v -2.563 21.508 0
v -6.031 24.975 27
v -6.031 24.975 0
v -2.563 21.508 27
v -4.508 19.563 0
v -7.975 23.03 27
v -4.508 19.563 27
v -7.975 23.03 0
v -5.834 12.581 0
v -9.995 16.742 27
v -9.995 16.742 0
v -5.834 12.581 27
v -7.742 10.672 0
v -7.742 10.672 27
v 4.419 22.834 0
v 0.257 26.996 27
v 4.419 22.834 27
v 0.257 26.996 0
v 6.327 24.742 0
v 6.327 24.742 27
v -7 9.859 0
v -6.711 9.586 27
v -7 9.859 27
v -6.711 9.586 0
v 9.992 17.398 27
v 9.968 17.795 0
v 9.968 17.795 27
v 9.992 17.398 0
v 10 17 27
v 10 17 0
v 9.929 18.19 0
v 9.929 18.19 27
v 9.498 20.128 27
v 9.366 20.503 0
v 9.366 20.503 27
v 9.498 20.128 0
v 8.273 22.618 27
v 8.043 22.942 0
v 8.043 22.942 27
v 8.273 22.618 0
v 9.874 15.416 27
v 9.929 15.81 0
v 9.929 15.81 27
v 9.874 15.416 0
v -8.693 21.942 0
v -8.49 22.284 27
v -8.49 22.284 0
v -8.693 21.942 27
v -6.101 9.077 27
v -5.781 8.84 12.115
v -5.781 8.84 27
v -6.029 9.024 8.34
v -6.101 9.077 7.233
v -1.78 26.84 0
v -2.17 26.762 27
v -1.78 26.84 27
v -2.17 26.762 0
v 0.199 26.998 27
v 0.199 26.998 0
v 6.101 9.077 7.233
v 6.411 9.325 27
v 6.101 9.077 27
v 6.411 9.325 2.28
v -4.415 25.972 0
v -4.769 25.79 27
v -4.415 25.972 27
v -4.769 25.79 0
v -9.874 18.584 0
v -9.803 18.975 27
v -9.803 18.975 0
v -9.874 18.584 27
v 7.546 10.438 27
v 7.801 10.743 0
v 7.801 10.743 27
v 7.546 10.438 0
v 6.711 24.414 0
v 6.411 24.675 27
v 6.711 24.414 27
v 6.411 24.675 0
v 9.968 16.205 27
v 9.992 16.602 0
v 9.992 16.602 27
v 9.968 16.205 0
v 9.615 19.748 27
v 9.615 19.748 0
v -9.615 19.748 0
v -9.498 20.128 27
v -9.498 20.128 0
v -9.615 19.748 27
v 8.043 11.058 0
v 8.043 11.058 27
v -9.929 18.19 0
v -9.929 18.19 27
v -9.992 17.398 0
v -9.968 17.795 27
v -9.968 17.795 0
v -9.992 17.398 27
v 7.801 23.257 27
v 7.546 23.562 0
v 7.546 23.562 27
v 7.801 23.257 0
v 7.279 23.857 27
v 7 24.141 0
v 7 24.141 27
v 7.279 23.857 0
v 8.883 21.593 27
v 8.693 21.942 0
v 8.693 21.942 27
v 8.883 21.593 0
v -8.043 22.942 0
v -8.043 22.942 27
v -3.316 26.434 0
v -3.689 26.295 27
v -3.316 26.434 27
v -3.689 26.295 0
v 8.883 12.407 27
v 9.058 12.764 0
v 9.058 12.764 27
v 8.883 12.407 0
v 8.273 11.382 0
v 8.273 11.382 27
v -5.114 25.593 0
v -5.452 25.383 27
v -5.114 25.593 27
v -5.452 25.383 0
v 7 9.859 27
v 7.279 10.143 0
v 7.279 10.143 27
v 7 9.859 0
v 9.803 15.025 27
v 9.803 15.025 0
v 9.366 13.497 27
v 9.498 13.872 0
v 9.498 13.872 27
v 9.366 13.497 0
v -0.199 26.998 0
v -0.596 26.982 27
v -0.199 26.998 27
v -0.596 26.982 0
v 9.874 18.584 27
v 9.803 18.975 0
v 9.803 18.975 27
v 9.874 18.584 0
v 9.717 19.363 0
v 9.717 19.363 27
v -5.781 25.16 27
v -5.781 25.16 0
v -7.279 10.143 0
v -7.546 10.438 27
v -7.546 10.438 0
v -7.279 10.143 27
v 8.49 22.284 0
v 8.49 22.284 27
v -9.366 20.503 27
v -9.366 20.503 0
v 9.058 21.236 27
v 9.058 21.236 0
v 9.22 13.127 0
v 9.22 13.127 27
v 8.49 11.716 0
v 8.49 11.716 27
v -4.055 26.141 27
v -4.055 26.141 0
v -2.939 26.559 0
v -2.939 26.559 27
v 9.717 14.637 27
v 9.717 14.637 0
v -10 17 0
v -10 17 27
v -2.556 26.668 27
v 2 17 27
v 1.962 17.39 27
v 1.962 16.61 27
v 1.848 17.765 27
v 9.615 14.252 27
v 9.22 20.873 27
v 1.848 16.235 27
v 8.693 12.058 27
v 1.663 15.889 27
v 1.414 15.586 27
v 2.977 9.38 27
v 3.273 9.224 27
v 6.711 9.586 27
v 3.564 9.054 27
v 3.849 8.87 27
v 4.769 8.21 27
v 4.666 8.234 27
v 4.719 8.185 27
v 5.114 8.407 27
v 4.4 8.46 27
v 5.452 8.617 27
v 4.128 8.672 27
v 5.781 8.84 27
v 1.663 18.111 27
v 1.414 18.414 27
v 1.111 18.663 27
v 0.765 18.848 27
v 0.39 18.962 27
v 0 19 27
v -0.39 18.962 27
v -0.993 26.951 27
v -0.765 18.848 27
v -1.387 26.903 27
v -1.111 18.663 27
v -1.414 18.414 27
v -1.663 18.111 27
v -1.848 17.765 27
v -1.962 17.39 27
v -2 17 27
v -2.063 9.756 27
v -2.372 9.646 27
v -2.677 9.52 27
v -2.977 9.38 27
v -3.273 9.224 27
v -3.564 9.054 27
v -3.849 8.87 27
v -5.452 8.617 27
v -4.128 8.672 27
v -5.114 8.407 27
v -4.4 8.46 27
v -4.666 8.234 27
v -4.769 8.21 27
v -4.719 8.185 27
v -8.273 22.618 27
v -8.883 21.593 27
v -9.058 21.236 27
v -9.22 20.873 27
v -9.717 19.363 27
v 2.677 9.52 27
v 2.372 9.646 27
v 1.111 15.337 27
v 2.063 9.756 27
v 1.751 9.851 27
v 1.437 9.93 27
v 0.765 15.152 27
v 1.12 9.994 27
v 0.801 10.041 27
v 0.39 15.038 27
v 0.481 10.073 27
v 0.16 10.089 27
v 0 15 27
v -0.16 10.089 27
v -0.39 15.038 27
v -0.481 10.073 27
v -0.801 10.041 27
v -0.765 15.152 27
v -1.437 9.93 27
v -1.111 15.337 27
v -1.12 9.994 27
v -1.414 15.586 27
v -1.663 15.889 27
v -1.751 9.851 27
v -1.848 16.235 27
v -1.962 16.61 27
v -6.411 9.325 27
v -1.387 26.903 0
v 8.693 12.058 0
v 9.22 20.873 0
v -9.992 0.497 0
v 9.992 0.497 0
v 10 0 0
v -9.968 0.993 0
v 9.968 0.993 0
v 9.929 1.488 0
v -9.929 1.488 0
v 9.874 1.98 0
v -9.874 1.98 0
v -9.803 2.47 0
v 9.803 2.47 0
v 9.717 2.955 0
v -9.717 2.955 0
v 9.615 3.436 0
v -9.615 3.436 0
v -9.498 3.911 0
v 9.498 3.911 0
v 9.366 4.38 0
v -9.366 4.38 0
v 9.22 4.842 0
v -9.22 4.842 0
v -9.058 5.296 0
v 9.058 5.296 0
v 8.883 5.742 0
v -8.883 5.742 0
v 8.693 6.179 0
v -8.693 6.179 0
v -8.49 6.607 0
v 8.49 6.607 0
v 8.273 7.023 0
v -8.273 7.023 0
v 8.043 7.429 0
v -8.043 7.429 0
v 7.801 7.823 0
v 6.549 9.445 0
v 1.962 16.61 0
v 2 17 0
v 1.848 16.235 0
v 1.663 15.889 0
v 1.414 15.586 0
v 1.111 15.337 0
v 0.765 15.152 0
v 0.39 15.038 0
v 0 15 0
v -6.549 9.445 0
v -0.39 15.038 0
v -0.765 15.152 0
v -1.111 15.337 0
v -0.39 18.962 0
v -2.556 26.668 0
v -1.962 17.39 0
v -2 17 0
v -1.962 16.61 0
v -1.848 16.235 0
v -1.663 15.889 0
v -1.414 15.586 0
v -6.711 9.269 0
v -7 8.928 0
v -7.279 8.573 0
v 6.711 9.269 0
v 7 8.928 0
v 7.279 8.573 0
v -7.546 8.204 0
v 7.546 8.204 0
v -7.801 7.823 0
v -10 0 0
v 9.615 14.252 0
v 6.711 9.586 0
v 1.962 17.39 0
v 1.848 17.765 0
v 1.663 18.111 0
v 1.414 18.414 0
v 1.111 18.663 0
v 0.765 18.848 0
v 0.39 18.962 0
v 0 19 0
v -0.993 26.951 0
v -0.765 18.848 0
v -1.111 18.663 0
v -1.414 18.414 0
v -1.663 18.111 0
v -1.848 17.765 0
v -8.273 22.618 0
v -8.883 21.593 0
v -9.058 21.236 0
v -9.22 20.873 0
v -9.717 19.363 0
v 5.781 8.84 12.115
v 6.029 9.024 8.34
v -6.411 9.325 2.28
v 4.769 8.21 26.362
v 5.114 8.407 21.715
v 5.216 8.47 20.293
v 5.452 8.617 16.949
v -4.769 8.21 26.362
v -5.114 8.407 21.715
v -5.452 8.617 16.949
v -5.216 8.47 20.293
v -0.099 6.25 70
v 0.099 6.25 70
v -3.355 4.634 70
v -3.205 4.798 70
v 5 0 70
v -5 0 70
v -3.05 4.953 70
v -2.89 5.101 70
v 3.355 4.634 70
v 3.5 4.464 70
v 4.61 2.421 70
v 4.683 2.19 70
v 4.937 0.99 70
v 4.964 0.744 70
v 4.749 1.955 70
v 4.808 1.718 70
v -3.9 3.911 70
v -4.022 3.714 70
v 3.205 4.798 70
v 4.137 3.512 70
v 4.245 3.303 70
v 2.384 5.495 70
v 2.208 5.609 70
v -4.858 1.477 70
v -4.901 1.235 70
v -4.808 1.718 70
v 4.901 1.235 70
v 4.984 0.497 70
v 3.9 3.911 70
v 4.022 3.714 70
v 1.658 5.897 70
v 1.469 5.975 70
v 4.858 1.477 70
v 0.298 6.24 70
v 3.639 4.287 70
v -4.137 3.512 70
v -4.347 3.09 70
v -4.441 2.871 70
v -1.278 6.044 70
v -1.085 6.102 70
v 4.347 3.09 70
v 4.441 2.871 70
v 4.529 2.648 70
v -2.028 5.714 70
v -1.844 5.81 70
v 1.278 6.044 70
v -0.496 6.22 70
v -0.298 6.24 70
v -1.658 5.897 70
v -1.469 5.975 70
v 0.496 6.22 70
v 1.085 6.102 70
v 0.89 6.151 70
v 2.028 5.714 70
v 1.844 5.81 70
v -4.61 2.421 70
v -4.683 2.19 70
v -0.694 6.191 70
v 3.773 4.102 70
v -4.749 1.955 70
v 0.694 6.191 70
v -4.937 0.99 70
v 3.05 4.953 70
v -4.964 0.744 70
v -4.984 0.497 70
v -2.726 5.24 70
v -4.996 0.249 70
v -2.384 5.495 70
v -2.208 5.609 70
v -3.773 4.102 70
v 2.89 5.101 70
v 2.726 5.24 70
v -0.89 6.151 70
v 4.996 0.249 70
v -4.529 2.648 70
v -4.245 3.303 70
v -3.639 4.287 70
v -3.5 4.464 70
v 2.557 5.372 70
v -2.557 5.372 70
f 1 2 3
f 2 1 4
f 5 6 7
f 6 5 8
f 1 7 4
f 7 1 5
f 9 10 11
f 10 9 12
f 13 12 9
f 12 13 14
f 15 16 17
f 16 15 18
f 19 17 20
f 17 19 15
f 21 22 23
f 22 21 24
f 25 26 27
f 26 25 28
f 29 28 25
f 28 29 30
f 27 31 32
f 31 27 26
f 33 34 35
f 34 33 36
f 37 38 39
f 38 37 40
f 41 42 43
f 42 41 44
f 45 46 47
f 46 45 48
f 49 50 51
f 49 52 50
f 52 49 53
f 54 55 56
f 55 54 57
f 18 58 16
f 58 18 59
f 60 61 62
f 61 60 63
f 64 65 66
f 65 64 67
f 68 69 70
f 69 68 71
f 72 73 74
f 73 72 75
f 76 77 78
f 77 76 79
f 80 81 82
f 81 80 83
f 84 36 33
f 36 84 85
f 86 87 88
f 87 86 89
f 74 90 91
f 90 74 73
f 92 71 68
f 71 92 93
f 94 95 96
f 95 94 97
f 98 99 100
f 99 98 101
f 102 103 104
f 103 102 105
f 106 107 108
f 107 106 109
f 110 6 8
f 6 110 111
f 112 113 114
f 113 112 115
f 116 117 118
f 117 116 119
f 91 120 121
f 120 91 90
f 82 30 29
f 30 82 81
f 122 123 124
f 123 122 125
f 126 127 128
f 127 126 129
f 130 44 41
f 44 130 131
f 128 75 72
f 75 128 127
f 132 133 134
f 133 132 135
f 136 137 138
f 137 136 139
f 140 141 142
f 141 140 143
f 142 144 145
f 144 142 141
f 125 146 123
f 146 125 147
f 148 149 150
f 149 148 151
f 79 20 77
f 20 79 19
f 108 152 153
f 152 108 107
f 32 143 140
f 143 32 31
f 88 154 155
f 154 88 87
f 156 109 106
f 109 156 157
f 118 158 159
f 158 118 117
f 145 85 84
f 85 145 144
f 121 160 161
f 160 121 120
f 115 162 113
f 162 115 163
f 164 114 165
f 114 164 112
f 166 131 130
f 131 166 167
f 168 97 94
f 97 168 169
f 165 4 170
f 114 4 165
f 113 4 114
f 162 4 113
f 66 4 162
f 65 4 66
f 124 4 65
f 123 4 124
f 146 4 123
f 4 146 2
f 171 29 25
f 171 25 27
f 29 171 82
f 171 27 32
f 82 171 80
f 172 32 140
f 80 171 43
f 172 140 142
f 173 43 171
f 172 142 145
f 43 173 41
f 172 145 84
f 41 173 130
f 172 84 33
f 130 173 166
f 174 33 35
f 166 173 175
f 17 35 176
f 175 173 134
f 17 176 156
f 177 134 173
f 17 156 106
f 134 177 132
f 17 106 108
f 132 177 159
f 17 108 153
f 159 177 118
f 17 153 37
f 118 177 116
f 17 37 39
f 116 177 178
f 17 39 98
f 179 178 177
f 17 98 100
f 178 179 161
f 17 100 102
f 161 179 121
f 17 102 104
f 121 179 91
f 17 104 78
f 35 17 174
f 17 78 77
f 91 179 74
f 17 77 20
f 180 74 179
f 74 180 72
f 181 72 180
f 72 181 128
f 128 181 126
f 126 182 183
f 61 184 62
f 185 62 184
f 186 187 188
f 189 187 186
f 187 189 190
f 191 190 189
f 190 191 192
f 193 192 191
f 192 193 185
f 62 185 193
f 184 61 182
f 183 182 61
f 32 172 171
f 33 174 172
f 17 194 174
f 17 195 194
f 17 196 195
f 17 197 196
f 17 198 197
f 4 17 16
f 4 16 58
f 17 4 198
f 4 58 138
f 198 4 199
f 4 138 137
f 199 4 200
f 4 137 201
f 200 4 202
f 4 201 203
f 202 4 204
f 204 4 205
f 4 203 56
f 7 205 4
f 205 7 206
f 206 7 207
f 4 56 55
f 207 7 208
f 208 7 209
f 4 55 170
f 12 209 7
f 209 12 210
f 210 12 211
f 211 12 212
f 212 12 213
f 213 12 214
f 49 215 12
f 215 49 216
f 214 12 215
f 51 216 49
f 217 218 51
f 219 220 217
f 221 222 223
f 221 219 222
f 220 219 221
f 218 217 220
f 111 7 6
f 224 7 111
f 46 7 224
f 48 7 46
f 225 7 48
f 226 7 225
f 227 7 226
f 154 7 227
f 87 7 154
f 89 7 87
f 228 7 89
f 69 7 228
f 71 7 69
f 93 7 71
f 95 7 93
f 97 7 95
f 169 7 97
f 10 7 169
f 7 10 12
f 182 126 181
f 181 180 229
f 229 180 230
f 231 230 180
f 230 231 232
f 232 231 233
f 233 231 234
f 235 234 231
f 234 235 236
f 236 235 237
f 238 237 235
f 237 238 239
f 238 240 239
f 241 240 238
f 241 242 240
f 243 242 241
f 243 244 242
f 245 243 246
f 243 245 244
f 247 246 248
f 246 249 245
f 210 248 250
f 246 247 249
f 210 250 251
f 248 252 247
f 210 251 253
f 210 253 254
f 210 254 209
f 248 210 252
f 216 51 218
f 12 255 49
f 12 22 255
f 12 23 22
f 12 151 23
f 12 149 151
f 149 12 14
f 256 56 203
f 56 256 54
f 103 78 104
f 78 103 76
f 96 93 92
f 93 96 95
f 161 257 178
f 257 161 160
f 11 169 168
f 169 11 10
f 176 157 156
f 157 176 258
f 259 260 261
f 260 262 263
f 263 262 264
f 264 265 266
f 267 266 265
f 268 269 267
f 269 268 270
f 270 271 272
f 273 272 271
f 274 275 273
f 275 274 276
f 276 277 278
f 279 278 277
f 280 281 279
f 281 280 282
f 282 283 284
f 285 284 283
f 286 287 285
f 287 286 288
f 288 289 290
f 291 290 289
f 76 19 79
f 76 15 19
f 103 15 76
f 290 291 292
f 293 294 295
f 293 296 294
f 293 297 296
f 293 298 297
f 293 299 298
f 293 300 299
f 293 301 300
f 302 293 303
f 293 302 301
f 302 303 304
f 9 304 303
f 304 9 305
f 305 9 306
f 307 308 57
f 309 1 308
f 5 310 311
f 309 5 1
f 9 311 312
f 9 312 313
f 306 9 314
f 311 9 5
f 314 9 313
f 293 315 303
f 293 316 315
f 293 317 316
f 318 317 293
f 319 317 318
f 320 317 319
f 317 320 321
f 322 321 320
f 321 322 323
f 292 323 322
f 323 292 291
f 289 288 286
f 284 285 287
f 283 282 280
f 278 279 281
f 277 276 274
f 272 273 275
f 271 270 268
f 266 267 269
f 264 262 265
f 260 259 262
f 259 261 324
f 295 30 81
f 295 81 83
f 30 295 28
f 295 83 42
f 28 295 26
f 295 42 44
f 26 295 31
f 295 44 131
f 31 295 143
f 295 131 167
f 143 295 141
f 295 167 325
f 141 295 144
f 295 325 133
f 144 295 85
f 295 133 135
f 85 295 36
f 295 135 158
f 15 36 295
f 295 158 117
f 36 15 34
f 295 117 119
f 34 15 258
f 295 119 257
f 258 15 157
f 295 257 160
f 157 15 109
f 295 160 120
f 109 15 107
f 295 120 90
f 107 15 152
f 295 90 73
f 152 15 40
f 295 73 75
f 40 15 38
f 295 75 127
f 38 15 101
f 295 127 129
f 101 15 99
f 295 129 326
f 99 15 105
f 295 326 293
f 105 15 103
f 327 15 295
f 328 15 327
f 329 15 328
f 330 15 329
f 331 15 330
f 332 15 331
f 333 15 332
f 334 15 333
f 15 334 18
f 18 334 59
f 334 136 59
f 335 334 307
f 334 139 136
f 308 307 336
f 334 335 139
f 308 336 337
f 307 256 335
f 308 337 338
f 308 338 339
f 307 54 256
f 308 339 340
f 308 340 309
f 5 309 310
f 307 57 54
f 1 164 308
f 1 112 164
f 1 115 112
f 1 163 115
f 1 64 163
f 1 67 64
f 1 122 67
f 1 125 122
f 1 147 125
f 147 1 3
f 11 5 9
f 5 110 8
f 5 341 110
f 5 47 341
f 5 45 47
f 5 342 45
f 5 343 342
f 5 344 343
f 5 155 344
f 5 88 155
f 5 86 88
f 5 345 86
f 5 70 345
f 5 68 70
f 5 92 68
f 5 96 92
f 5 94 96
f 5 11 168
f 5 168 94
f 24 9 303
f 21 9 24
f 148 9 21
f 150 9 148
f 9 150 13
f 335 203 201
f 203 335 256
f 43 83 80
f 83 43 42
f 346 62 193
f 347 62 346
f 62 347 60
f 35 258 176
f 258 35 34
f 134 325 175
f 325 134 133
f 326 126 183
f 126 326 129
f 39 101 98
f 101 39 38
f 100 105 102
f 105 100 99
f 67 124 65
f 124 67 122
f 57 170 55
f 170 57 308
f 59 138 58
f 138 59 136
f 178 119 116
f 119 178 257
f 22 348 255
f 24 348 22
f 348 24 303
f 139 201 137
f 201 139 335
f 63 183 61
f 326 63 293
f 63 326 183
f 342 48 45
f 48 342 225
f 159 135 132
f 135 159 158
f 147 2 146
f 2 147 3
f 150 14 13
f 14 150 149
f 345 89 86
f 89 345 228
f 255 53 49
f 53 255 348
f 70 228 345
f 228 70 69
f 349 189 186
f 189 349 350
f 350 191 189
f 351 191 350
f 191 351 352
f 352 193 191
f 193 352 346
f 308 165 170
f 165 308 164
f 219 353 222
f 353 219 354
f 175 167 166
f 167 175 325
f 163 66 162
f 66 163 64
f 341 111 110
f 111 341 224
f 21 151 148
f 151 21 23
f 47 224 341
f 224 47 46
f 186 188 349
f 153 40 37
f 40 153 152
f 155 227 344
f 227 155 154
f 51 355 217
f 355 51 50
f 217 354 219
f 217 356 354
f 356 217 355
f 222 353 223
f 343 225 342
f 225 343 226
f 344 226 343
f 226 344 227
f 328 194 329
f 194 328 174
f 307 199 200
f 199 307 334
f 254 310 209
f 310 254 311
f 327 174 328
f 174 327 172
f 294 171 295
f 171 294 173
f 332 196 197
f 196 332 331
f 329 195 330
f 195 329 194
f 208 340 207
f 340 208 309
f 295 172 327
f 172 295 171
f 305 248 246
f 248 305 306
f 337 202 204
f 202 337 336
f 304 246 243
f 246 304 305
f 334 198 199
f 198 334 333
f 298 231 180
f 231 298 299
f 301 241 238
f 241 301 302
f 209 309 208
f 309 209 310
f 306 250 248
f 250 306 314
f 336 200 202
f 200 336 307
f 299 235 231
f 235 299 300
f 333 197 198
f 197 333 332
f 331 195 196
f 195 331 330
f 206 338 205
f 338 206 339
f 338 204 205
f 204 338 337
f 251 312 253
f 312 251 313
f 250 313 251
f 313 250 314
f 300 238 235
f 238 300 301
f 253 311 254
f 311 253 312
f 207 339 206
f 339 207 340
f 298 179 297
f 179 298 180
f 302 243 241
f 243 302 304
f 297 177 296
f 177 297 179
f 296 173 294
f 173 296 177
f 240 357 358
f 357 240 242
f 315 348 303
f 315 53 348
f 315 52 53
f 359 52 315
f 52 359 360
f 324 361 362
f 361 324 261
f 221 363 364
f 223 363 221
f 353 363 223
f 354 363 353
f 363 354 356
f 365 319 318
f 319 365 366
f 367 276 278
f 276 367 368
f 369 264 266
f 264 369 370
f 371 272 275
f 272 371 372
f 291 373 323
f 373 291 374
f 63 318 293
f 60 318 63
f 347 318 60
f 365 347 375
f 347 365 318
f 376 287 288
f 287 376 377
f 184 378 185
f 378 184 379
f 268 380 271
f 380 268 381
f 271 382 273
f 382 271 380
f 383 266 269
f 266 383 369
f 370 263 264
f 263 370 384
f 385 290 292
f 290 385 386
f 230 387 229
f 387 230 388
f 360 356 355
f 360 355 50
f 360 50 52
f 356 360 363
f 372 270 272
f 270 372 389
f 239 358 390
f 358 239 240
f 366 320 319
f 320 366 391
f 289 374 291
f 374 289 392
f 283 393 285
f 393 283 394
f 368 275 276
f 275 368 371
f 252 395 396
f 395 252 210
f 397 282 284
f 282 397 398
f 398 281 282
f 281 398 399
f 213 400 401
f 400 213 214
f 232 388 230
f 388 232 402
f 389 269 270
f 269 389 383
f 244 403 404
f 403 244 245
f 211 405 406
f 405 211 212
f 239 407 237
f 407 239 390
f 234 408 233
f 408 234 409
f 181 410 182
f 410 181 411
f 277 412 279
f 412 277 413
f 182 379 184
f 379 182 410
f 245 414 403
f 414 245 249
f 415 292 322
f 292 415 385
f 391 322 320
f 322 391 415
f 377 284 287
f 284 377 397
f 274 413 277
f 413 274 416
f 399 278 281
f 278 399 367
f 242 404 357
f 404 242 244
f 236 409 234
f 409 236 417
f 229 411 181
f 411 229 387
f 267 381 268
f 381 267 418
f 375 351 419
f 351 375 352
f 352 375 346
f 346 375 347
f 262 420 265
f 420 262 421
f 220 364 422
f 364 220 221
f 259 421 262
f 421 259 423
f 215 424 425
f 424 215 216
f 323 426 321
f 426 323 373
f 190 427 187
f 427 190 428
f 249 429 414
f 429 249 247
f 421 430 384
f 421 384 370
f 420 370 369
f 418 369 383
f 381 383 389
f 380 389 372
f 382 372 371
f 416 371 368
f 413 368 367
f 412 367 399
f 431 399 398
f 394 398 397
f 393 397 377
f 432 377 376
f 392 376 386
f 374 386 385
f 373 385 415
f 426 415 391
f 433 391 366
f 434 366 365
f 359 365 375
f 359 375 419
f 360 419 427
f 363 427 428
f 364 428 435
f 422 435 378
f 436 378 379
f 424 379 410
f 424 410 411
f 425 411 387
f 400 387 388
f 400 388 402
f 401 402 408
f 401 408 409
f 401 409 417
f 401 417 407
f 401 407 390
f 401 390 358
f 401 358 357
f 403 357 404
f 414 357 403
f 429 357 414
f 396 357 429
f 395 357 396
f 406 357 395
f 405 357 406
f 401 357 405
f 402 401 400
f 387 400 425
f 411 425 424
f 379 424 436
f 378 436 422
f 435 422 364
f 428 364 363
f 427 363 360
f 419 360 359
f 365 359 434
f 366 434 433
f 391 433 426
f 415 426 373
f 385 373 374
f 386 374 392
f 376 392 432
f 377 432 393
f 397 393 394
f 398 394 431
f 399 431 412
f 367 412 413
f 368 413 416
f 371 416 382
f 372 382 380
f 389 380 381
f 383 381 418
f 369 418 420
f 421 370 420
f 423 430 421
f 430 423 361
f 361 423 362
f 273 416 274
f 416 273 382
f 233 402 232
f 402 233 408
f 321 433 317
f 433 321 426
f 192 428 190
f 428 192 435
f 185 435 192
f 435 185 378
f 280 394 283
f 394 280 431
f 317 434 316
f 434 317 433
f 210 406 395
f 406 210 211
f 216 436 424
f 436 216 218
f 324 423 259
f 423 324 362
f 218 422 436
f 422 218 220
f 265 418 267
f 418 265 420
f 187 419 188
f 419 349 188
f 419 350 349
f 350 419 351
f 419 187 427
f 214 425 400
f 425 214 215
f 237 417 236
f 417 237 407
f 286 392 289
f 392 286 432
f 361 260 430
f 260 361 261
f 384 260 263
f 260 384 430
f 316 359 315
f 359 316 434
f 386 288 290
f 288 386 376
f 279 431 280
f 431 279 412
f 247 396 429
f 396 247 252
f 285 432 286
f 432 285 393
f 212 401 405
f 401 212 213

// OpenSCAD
use <MCAD/boxes.scad>

$fa=1;
$fs=0.4;

module fin_cutout(c_offset=17, f_height=27){
    fin_length=2.75;
    fin_width=20;
    fin_height=2*f_height+1;
    fin_offset=10;
    fin_lateral_offset=4;
    fin_depth=c_offset+7;

    // center
    translate([0,fin_depth+fin_lateral_offset,0])
    cube([fin_length, fin_width, fin_height], center=true);
    // side negative
    translate([-fin_offset,fin_depth,0])
    cube([2*fin_length, fin_width, fin_height], center=true);
    // side positive
    translate([fin_offset,fin_depth,0])
    cube([2*fin_length, fin_width, fin_height], center=true);
}

module leg(){
    leg_length=70;
    leg_width=20;
    leg_height=10;
    scaling_factor=.5;
    rear_height=20;
    rear_width=25;
//rotate([0,0,0])
//    translate([50,50,0]);
//    //linear_extrude(height=leg_length,center=true,scale=scaling_factor)
//        resize([leg_length,leg_width])
//        difference(){
//            circle(d=leg_height);
//            translate([-leg_height/2,0,0])
//            square([leg_height,leg_height],center=true);
//
//        }
    rotate([-90,0,90])
        rotate([90,90,0])
        linear_extrude(height=leg_length,center=false,scale=scaling_factor)
            difference(){
                resize([rear_height,rear_width]){
                    circle(d=rear_height);
                }
                translate([0,-rear_height/2,0])
                    square(size=rear_height, center=true);
            }
}

fan_radius=10;
fan_height=27;
screw_radius=2;
cylinder_offset=17;
short=false;

difference(){
    union(){
        translate([0,cylinder_offset,0])
        difference(){
            cylinder(r=fan_radius, h=fan_height);
            cylinder(r=screw_radius, h=2*fan_height+1, center=true);
            rotate([0,0,45])
            fin_cutout(4, fan_height);
            }

        leg();
    }
    if(short) { translate([0,0,55])
        cube([100,100,100], center=true);
    }
}
